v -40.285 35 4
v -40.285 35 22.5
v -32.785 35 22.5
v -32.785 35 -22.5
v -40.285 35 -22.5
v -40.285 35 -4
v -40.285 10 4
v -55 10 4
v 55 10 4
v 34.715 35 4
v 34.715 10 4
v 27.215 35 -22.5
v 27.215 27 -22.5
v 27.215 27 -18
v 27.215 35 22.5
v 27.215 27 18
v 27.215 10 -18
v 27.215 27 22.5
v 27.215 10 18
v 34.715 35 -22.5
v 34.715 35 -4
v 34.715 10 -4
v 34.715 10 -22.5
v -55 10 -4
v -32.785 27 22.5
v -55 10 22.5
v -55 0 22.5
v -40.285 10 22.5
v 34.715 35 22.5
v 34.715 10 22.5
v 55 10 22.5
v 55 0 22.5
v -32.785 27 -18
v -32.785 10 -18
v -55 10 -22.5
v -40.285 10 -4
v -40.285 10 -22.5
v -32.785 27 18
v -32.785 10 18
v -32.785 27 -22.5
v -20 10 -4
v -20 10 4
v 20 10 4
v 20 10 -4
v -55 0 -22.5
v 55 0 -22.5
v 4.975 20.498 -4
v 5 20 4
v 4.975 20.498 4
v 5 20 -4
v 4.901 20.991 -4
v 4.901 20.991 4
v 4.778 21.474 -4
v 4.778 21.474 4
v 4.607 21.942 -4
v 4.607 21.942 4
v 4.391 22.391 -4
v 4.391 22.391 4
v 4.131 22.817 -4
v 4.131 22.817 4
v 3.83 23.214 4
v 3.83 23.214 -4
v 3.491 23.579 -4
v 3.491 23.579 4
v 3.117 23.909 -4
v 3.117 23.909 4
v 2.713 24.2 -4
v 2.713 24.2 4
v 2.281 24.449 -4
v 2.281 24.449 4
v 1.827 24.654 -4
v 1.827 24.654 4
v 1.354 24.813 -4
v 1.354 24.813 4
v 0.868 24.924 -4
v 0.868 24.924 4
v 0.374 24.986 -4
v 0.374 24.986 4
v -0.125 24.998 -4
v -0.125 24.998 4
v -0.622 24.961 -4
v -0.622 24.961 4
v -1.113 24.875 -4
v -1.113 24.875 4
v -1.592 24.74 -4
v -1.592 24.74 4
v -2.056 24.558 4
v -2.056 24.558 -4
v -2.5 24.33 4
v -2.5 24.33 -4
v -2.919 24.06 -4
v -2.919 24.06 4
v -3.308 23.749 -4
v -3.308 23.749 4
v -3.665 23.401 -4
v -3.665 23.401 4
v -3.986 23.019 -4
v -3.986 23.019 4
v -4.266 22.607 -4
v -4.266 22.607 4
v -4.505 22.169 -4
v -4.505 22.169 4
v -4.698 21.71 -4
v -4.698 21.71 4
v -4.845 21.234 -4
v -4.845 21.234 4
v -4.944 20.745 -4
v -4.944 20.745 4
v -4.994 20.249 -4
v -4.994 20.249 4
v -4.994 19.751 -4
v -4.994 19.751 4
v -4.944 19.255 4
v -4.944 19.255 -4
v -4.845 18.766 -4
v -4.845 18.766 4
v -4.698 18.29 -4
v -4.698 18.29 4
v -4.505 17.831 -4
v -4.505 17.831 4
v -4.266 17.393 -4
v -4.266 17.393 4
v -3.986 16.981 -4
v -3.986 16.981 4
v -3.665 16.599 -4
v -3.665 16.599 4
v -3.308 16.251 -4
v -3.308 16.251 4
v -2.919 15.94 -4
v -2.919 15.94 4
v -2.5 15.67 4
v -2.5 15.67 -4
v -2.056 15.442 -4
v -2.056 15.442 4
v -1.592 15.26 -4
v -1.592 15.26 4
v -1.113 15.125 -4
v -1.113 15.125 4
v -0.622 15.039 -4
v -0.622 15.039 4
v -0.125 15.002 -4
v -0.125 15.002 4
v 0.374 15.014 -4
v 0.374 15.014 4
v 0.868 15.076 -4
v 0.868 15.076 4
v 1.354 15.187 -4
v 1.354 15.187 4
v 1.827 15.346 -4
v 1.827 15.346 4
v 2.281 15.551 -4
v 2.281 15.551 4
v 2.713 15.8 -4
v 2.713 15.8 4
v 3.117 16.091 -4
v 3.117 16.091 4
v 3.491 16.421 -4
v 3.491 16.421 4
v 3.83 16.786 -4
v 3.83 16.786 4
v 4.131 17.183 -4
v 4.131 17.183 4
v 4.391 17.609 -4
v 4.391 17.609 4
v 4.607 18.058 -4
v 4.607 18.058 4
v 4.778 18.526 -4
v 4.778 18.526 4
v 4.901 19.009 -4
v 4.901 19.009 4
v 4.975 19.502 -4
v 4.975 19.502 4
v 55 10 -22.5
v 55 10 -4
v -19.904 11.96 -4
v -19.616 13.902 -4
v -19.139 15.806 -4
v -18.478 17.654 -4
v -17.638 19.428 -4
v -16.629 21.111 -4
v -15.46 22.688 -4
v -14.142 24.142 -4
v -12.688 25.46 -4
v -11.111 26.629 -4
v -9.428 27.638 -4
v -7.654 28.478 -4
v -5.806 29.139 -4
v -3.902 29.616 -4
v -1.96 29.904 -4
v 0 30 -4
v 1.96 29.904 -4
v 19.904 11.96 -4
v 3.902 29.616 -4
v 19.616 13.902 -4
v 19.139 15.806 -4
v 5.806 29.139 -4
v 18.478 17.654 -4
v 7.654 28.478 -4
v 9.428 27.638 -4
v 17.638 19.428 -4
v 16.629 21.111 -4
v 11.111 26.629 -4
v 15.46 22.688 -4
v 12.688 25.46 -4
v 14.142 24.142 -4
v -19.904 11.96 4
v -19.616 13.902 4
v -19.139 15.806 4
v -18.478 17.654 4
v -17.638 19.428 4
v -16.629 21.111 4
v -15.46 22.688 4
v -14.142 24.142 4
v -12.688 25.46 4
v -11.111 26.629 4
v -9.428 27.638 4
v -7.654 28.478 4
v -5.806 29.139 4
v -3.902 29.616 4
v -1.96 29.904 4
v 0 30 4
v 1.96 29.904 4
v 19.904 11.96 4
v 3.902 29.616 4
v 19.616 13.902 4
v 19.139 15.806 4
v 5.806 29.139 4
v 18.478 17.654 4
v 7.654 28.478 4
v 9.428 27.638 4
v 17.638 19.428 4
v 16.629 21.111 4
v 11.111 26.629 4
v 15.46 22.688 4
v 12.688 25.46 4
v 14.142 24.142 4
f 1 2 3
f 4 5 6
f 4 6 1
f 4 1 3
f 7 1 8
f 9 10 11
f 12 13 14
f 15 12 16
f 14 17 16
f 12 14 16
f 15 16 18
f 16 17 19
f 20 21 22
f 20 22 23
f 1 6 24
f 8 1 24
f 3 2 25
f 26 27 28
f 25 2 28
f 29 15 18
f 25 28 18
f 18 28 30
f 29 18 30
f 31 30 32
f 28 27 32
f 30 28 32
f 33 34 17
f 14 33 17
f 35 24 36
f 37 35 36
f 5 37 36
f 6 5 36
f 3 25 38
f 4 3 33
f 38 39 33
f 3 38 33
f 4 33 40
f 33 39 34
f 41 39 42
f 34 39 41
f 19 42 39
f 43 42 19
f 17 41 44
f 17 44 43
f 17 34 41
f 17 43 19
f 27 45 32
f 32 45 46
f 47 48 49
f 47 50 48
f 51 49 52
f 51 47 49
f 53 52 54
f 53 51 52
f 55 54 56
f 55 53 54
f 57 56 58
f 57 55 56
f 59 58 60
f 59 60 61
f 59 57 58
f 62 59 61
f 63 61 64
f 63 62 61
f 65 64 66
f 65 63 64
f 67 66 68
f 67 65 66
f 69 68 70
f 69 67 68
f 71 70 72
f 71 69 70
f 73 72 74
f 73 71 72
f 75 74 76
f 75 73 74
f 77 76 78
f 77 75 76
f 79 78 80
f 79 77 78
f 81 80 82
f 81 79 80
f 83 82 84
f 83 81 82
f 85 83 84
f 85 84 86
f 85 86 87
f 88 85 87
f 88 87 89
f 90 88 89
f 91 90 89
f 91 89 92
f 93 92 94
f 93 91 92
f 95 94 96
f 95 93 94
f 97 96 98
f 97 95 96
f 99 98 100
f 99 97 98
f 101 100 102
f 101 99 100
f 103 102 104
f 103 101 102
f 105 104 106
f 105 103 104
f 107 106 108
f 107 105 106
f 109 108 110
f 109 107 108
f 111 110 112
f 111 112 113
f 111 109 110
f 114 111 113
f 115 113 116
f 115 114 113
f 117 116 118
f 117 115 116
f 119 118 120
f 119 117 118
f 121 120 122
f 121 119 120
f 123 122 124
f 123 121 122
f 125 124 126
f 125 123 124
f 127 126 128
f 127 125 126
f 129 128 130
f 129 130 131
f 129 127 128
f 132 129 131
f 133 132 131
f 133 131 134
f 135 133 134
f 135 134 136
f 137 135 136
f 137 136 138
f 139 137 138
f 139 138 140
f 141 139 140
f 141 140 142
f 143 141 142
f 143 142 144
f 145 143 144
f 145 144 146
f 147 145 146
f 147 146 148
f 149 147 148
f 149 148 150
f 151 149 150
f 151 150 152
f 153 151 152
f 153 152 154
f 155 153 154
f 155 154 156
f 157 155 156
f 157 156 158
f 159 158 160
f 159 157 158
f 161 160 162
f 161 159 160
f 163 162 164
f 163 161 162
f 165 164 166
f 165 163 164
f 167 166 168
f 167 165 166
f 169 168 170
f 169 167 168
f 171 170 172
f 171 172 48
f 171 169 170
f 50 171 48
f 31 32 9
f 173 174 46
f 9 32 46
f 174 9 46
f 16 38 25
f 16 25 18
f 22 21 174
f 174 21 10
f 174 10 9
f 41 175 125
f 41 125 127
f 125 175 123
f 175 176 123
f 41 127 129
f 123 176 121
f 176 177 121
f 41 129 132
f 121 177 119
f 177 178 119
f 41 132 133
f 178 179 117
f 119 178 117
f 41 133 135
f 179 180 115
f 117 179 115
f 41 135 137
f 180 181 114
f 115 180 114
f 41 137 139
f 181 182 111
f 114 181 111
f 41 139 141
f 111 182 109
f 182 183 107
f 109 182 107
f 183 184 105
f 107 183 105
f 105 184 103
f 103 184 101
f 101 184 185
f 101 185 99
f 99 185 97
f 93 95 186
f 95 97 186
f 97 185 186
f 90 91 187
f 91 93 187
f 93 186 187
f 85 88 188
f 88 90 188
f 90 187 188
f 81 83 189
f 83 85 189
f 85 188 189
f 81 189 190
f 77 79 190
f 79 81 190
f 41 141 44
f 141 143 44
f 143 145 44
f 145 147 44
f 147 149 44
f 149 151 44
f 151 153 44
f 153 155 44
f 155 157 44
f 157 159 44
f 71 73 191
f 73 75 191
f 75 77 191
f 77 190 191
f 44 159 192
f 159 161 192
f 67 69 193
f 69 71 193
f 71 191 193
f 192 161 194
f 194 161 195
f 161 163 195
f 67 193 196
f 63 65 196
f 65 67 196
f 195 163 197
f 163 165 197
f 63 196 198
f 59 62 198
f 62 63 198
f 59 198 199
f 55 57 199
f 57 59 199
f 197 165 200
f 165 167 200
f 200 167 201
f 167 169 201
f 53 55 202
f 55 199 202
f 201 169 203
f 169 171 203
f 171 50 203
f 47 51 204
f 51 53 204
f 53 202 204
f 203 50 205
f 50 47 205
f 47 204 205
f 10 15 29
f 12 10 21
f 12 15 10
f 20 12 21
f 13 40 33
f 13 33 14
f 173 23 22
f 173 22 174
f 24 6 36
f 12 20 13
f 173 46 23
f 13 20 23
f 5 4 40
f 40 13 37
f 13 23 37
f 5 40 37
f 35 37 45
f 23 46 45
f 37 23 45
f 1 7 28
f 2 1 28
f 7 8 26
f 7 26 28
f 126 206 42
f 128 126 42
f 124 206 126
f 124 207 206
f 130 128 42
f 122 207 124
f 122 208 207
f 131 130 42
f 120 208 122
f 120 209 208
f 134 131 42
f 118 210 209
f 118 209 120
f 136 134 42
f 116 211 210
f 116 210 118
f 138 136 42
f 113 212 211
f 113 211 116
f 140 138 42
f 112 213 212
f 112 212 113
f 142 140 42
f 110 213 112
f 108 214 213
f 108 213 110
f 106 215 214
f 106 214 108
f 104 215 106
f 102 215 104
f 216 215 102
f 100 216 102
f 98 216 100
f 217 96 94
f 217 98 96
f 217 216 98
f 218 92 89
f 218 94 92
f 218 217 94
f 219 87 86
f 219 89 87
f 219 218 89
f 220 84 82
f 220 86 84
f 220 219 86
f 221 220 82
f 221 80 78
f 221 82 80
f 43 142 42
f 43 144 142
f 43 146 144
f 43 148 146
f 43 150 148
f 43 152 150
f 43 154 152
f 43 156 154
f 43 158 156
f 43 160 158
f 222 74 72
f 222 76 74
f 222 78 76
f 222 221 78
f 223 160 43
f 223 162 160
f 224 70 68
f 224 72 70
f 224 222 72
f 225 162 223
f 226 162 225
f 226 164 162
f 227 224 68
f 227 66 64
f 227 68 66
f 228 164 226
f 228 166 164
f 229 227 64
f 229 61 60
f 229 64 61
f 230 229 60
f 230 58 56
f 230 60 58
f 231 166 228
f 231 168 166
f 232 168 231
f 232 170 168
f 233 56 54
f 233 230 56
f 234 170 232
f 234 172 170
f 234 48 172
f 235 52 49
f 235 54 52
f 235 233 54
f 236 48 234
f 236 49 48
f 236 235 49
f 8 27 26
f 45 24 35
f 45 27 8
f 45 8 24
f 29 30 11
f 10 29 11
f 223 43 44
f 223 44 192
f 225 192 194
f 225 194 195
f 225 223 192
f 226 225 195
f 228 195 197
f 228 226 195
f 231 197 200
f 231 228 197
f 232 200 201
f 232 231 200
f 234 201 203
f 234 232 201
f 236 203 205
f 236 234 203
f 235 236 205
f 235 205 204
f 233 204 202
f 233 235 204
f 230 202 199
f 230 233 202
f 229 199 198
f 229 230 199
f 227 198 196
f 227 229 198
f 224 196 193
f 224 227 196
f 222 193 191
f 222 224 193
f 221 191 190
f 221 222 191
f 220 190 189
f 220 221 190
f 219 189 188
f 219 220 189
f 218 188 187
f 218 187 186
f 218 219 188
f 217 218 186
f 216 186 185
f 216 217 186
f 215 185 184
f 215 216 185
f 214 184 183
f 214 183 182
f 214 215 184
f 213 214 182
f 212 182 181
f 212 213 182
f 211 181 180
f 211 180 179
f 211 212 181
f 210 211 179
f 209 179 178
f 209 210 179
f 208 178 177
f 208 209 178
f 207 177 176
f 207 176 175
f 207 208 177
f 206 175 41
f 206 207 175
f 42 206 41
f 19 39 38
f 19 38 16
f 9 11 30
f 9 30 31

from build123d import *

# Parameters (mm, degrees)
SKETCH3_W             = 14.715370019
SKETCH3_H             = 45
BOSS_EXTRUDE4_DEPTH   = 10
SKETCH3_W_2           = 60
SKETCH3_H_2           = 36
BOSS_EXTRUDE4_2_DEPTH = 10
SKETCH3_W_3           = 20.284629981
BOSS_EXTRUDE4_3_DEPTH = 10
SKETCH3_3_W           = 7.5
SKETCH3_3_H           = 45
BOSS_EXTRUDE5_DEPTH   = 35
SKETCH3_4_W           = 60
SKETCH3_4_H           = 4.5
BOSS_EXTRUDE6_DEPTH   = 27
SKETCH4_R             = 5
BOSS_EXTRUDE7_DEPTH   = 4
RIB1_REACH            = 70.966
SKETCH5_WALL_W        = 168.940487542
SKETCH5_WALL_H        = 8
RIB2_REACH            = 70.966
SKETCH6_WALL_W        = 172.12533758
SKETCH6_WALL_H        = 8


with BuildPart() as part:
    # Sketch3 → Boss-Extrude4 (new body)
    with BuildSketch(Plane(origin=(0, 0, 0), x_dir=(1, 0, 0), z_dir=(0, 1, 0))):
        with Locations((-47.64231499, 0)):
            Rectangle(SKETCH3_W, SKETCH3_H)
    extrude(amount=BOSS_EXTRUDE4_DEPTH)



with BuildPart() as body_2:
    # Sketch3 → Boss-Extrude4 2 (new body)
    with BuildSketch(Plane(origin=(0, 0, 0), x_dir=(1, 0, 0), z_dir=(0, 1, 0))):
        with Locations((-2.784629981, 0)):
            Rectangle(SKETCH3_W_2, SKETCH3_H_2)
    extrude(amount=BOSS_EXTRUDE4_2_DEPTH)


with BuildPart() as body_3:
    # Sketch3 → Boss-Extrude4 3 (new body)
    with BuildSketch(Plane(origin=(0, 0, 0), x_dir=(1, 0, 0), z_dir=(0, 1, 0))):
        with Locations((44.85768501, 0)):
            Rectangle(SKETCH3_W_3, SKETCH3_H)
    extrude(amount=BOSS_EXTRUDE4_3_DEPTH)


with BuildPart() as part_1:
    add(part.part)

    add(body_2.part)  # Boss-Extrude5 merges body 2

    add(body_3.part)  # Boss-Extrude5 merges body 3
    # Sketch3<3> → Boss-Extrude5 (add)
    with BuildSketch(Plane(origin=(0, 0, 0), x_dir=(1, 0, 0), z_dir=(0, 1, 0))):
        with Locations((-36.534629981, 0)):
            Rectangle(SKETCH3_3_W, SKETCH3_3_H)
        with Locations((30.965370019, 0)):
            Rectangle(SKETCH3_3_W, SKETCH3_3_H)
    extrude(amount=BOSS_EXTRUDE5_DEPTH)

    # Sketch3<4> → Boss-Extrude6 (add)
    with BuildSketch(Plane(origin=(0, 0, 0), x_dir=(1, 0, 0), z_dir=(0, 1, 0))):
        with Locations((-2.784629981, 20.25)):
            Rectangle(SKETCH3_4_W, SKETCH3_4_H)
        with Locations((-2.784629981, -20.25)):
            Rectangle(SKETCH3_4_W, SKETCH3_4_H)
    extrude(amount=BOSS_EXTRUDE6_DEPTH)

    # Sketch4 → Boss-Extrude7 (add, symmetric)
    with BuildSketch(Plane.XY):
        with BuildLine():
            Line((-20, 10), (20, 10))
            ThreePointArc((20, 10), (0, 30), (-20, 10))
        make_face()
        with Locations((0, 20)):
            Circle(SKETCH4_R, mode=Mode.SUBTRACT)
    extrude(amount=BOSS_EXTRUDE7_DEPTH, both=True)

    # Sketch5 wall → Rib1 (add, up to next)
    with BuildSketch(Plane(origin=(-47.64231499, 22.5, 0), x_dir=(-0.507263085957, -0.861791251769, 0), z_dir=(0.861791251769, -0.507263085957, 0)), mode=Mode.PRIVATE) as rib1_sk1:
        Rectangle(SKETCH5_WALL_W, SKETCH5_WALL_H)
    rib1_tool1 = extrude(rib1_sk1.sketch, amount=RIB1_REACH, mode=Mode.PRIVATE) - part_1.part
    add(rib1_tool1.solids().sort_by_distance((-47.64231499, 22.5, 0))[0])

    # Sketch6 wall → Rib2 (add, up to next)
    with BuildSketch(Plane(origin=(44.85768501, 22.5, 0), x_dir=(0.630071035104, -0.77653750117, 0), z_dir=(0.77653750117, 0.630071035104, 0)), mode=Mode.PRIVATE) as rib2_sk1:
        Rectangle(SKETCH6_WALL_W, SKETCH6_WALL_H)
    rib2_tool1 = extrude(rib2_sk1.sketch, amount=-RIB2_REACH, mode=Mode.PRIVATE) - part_1.part
    add(rib2_tool1.solids().sort_by_distance((44.85768501, 22.5, 0))[0])


solid = part_1.part
